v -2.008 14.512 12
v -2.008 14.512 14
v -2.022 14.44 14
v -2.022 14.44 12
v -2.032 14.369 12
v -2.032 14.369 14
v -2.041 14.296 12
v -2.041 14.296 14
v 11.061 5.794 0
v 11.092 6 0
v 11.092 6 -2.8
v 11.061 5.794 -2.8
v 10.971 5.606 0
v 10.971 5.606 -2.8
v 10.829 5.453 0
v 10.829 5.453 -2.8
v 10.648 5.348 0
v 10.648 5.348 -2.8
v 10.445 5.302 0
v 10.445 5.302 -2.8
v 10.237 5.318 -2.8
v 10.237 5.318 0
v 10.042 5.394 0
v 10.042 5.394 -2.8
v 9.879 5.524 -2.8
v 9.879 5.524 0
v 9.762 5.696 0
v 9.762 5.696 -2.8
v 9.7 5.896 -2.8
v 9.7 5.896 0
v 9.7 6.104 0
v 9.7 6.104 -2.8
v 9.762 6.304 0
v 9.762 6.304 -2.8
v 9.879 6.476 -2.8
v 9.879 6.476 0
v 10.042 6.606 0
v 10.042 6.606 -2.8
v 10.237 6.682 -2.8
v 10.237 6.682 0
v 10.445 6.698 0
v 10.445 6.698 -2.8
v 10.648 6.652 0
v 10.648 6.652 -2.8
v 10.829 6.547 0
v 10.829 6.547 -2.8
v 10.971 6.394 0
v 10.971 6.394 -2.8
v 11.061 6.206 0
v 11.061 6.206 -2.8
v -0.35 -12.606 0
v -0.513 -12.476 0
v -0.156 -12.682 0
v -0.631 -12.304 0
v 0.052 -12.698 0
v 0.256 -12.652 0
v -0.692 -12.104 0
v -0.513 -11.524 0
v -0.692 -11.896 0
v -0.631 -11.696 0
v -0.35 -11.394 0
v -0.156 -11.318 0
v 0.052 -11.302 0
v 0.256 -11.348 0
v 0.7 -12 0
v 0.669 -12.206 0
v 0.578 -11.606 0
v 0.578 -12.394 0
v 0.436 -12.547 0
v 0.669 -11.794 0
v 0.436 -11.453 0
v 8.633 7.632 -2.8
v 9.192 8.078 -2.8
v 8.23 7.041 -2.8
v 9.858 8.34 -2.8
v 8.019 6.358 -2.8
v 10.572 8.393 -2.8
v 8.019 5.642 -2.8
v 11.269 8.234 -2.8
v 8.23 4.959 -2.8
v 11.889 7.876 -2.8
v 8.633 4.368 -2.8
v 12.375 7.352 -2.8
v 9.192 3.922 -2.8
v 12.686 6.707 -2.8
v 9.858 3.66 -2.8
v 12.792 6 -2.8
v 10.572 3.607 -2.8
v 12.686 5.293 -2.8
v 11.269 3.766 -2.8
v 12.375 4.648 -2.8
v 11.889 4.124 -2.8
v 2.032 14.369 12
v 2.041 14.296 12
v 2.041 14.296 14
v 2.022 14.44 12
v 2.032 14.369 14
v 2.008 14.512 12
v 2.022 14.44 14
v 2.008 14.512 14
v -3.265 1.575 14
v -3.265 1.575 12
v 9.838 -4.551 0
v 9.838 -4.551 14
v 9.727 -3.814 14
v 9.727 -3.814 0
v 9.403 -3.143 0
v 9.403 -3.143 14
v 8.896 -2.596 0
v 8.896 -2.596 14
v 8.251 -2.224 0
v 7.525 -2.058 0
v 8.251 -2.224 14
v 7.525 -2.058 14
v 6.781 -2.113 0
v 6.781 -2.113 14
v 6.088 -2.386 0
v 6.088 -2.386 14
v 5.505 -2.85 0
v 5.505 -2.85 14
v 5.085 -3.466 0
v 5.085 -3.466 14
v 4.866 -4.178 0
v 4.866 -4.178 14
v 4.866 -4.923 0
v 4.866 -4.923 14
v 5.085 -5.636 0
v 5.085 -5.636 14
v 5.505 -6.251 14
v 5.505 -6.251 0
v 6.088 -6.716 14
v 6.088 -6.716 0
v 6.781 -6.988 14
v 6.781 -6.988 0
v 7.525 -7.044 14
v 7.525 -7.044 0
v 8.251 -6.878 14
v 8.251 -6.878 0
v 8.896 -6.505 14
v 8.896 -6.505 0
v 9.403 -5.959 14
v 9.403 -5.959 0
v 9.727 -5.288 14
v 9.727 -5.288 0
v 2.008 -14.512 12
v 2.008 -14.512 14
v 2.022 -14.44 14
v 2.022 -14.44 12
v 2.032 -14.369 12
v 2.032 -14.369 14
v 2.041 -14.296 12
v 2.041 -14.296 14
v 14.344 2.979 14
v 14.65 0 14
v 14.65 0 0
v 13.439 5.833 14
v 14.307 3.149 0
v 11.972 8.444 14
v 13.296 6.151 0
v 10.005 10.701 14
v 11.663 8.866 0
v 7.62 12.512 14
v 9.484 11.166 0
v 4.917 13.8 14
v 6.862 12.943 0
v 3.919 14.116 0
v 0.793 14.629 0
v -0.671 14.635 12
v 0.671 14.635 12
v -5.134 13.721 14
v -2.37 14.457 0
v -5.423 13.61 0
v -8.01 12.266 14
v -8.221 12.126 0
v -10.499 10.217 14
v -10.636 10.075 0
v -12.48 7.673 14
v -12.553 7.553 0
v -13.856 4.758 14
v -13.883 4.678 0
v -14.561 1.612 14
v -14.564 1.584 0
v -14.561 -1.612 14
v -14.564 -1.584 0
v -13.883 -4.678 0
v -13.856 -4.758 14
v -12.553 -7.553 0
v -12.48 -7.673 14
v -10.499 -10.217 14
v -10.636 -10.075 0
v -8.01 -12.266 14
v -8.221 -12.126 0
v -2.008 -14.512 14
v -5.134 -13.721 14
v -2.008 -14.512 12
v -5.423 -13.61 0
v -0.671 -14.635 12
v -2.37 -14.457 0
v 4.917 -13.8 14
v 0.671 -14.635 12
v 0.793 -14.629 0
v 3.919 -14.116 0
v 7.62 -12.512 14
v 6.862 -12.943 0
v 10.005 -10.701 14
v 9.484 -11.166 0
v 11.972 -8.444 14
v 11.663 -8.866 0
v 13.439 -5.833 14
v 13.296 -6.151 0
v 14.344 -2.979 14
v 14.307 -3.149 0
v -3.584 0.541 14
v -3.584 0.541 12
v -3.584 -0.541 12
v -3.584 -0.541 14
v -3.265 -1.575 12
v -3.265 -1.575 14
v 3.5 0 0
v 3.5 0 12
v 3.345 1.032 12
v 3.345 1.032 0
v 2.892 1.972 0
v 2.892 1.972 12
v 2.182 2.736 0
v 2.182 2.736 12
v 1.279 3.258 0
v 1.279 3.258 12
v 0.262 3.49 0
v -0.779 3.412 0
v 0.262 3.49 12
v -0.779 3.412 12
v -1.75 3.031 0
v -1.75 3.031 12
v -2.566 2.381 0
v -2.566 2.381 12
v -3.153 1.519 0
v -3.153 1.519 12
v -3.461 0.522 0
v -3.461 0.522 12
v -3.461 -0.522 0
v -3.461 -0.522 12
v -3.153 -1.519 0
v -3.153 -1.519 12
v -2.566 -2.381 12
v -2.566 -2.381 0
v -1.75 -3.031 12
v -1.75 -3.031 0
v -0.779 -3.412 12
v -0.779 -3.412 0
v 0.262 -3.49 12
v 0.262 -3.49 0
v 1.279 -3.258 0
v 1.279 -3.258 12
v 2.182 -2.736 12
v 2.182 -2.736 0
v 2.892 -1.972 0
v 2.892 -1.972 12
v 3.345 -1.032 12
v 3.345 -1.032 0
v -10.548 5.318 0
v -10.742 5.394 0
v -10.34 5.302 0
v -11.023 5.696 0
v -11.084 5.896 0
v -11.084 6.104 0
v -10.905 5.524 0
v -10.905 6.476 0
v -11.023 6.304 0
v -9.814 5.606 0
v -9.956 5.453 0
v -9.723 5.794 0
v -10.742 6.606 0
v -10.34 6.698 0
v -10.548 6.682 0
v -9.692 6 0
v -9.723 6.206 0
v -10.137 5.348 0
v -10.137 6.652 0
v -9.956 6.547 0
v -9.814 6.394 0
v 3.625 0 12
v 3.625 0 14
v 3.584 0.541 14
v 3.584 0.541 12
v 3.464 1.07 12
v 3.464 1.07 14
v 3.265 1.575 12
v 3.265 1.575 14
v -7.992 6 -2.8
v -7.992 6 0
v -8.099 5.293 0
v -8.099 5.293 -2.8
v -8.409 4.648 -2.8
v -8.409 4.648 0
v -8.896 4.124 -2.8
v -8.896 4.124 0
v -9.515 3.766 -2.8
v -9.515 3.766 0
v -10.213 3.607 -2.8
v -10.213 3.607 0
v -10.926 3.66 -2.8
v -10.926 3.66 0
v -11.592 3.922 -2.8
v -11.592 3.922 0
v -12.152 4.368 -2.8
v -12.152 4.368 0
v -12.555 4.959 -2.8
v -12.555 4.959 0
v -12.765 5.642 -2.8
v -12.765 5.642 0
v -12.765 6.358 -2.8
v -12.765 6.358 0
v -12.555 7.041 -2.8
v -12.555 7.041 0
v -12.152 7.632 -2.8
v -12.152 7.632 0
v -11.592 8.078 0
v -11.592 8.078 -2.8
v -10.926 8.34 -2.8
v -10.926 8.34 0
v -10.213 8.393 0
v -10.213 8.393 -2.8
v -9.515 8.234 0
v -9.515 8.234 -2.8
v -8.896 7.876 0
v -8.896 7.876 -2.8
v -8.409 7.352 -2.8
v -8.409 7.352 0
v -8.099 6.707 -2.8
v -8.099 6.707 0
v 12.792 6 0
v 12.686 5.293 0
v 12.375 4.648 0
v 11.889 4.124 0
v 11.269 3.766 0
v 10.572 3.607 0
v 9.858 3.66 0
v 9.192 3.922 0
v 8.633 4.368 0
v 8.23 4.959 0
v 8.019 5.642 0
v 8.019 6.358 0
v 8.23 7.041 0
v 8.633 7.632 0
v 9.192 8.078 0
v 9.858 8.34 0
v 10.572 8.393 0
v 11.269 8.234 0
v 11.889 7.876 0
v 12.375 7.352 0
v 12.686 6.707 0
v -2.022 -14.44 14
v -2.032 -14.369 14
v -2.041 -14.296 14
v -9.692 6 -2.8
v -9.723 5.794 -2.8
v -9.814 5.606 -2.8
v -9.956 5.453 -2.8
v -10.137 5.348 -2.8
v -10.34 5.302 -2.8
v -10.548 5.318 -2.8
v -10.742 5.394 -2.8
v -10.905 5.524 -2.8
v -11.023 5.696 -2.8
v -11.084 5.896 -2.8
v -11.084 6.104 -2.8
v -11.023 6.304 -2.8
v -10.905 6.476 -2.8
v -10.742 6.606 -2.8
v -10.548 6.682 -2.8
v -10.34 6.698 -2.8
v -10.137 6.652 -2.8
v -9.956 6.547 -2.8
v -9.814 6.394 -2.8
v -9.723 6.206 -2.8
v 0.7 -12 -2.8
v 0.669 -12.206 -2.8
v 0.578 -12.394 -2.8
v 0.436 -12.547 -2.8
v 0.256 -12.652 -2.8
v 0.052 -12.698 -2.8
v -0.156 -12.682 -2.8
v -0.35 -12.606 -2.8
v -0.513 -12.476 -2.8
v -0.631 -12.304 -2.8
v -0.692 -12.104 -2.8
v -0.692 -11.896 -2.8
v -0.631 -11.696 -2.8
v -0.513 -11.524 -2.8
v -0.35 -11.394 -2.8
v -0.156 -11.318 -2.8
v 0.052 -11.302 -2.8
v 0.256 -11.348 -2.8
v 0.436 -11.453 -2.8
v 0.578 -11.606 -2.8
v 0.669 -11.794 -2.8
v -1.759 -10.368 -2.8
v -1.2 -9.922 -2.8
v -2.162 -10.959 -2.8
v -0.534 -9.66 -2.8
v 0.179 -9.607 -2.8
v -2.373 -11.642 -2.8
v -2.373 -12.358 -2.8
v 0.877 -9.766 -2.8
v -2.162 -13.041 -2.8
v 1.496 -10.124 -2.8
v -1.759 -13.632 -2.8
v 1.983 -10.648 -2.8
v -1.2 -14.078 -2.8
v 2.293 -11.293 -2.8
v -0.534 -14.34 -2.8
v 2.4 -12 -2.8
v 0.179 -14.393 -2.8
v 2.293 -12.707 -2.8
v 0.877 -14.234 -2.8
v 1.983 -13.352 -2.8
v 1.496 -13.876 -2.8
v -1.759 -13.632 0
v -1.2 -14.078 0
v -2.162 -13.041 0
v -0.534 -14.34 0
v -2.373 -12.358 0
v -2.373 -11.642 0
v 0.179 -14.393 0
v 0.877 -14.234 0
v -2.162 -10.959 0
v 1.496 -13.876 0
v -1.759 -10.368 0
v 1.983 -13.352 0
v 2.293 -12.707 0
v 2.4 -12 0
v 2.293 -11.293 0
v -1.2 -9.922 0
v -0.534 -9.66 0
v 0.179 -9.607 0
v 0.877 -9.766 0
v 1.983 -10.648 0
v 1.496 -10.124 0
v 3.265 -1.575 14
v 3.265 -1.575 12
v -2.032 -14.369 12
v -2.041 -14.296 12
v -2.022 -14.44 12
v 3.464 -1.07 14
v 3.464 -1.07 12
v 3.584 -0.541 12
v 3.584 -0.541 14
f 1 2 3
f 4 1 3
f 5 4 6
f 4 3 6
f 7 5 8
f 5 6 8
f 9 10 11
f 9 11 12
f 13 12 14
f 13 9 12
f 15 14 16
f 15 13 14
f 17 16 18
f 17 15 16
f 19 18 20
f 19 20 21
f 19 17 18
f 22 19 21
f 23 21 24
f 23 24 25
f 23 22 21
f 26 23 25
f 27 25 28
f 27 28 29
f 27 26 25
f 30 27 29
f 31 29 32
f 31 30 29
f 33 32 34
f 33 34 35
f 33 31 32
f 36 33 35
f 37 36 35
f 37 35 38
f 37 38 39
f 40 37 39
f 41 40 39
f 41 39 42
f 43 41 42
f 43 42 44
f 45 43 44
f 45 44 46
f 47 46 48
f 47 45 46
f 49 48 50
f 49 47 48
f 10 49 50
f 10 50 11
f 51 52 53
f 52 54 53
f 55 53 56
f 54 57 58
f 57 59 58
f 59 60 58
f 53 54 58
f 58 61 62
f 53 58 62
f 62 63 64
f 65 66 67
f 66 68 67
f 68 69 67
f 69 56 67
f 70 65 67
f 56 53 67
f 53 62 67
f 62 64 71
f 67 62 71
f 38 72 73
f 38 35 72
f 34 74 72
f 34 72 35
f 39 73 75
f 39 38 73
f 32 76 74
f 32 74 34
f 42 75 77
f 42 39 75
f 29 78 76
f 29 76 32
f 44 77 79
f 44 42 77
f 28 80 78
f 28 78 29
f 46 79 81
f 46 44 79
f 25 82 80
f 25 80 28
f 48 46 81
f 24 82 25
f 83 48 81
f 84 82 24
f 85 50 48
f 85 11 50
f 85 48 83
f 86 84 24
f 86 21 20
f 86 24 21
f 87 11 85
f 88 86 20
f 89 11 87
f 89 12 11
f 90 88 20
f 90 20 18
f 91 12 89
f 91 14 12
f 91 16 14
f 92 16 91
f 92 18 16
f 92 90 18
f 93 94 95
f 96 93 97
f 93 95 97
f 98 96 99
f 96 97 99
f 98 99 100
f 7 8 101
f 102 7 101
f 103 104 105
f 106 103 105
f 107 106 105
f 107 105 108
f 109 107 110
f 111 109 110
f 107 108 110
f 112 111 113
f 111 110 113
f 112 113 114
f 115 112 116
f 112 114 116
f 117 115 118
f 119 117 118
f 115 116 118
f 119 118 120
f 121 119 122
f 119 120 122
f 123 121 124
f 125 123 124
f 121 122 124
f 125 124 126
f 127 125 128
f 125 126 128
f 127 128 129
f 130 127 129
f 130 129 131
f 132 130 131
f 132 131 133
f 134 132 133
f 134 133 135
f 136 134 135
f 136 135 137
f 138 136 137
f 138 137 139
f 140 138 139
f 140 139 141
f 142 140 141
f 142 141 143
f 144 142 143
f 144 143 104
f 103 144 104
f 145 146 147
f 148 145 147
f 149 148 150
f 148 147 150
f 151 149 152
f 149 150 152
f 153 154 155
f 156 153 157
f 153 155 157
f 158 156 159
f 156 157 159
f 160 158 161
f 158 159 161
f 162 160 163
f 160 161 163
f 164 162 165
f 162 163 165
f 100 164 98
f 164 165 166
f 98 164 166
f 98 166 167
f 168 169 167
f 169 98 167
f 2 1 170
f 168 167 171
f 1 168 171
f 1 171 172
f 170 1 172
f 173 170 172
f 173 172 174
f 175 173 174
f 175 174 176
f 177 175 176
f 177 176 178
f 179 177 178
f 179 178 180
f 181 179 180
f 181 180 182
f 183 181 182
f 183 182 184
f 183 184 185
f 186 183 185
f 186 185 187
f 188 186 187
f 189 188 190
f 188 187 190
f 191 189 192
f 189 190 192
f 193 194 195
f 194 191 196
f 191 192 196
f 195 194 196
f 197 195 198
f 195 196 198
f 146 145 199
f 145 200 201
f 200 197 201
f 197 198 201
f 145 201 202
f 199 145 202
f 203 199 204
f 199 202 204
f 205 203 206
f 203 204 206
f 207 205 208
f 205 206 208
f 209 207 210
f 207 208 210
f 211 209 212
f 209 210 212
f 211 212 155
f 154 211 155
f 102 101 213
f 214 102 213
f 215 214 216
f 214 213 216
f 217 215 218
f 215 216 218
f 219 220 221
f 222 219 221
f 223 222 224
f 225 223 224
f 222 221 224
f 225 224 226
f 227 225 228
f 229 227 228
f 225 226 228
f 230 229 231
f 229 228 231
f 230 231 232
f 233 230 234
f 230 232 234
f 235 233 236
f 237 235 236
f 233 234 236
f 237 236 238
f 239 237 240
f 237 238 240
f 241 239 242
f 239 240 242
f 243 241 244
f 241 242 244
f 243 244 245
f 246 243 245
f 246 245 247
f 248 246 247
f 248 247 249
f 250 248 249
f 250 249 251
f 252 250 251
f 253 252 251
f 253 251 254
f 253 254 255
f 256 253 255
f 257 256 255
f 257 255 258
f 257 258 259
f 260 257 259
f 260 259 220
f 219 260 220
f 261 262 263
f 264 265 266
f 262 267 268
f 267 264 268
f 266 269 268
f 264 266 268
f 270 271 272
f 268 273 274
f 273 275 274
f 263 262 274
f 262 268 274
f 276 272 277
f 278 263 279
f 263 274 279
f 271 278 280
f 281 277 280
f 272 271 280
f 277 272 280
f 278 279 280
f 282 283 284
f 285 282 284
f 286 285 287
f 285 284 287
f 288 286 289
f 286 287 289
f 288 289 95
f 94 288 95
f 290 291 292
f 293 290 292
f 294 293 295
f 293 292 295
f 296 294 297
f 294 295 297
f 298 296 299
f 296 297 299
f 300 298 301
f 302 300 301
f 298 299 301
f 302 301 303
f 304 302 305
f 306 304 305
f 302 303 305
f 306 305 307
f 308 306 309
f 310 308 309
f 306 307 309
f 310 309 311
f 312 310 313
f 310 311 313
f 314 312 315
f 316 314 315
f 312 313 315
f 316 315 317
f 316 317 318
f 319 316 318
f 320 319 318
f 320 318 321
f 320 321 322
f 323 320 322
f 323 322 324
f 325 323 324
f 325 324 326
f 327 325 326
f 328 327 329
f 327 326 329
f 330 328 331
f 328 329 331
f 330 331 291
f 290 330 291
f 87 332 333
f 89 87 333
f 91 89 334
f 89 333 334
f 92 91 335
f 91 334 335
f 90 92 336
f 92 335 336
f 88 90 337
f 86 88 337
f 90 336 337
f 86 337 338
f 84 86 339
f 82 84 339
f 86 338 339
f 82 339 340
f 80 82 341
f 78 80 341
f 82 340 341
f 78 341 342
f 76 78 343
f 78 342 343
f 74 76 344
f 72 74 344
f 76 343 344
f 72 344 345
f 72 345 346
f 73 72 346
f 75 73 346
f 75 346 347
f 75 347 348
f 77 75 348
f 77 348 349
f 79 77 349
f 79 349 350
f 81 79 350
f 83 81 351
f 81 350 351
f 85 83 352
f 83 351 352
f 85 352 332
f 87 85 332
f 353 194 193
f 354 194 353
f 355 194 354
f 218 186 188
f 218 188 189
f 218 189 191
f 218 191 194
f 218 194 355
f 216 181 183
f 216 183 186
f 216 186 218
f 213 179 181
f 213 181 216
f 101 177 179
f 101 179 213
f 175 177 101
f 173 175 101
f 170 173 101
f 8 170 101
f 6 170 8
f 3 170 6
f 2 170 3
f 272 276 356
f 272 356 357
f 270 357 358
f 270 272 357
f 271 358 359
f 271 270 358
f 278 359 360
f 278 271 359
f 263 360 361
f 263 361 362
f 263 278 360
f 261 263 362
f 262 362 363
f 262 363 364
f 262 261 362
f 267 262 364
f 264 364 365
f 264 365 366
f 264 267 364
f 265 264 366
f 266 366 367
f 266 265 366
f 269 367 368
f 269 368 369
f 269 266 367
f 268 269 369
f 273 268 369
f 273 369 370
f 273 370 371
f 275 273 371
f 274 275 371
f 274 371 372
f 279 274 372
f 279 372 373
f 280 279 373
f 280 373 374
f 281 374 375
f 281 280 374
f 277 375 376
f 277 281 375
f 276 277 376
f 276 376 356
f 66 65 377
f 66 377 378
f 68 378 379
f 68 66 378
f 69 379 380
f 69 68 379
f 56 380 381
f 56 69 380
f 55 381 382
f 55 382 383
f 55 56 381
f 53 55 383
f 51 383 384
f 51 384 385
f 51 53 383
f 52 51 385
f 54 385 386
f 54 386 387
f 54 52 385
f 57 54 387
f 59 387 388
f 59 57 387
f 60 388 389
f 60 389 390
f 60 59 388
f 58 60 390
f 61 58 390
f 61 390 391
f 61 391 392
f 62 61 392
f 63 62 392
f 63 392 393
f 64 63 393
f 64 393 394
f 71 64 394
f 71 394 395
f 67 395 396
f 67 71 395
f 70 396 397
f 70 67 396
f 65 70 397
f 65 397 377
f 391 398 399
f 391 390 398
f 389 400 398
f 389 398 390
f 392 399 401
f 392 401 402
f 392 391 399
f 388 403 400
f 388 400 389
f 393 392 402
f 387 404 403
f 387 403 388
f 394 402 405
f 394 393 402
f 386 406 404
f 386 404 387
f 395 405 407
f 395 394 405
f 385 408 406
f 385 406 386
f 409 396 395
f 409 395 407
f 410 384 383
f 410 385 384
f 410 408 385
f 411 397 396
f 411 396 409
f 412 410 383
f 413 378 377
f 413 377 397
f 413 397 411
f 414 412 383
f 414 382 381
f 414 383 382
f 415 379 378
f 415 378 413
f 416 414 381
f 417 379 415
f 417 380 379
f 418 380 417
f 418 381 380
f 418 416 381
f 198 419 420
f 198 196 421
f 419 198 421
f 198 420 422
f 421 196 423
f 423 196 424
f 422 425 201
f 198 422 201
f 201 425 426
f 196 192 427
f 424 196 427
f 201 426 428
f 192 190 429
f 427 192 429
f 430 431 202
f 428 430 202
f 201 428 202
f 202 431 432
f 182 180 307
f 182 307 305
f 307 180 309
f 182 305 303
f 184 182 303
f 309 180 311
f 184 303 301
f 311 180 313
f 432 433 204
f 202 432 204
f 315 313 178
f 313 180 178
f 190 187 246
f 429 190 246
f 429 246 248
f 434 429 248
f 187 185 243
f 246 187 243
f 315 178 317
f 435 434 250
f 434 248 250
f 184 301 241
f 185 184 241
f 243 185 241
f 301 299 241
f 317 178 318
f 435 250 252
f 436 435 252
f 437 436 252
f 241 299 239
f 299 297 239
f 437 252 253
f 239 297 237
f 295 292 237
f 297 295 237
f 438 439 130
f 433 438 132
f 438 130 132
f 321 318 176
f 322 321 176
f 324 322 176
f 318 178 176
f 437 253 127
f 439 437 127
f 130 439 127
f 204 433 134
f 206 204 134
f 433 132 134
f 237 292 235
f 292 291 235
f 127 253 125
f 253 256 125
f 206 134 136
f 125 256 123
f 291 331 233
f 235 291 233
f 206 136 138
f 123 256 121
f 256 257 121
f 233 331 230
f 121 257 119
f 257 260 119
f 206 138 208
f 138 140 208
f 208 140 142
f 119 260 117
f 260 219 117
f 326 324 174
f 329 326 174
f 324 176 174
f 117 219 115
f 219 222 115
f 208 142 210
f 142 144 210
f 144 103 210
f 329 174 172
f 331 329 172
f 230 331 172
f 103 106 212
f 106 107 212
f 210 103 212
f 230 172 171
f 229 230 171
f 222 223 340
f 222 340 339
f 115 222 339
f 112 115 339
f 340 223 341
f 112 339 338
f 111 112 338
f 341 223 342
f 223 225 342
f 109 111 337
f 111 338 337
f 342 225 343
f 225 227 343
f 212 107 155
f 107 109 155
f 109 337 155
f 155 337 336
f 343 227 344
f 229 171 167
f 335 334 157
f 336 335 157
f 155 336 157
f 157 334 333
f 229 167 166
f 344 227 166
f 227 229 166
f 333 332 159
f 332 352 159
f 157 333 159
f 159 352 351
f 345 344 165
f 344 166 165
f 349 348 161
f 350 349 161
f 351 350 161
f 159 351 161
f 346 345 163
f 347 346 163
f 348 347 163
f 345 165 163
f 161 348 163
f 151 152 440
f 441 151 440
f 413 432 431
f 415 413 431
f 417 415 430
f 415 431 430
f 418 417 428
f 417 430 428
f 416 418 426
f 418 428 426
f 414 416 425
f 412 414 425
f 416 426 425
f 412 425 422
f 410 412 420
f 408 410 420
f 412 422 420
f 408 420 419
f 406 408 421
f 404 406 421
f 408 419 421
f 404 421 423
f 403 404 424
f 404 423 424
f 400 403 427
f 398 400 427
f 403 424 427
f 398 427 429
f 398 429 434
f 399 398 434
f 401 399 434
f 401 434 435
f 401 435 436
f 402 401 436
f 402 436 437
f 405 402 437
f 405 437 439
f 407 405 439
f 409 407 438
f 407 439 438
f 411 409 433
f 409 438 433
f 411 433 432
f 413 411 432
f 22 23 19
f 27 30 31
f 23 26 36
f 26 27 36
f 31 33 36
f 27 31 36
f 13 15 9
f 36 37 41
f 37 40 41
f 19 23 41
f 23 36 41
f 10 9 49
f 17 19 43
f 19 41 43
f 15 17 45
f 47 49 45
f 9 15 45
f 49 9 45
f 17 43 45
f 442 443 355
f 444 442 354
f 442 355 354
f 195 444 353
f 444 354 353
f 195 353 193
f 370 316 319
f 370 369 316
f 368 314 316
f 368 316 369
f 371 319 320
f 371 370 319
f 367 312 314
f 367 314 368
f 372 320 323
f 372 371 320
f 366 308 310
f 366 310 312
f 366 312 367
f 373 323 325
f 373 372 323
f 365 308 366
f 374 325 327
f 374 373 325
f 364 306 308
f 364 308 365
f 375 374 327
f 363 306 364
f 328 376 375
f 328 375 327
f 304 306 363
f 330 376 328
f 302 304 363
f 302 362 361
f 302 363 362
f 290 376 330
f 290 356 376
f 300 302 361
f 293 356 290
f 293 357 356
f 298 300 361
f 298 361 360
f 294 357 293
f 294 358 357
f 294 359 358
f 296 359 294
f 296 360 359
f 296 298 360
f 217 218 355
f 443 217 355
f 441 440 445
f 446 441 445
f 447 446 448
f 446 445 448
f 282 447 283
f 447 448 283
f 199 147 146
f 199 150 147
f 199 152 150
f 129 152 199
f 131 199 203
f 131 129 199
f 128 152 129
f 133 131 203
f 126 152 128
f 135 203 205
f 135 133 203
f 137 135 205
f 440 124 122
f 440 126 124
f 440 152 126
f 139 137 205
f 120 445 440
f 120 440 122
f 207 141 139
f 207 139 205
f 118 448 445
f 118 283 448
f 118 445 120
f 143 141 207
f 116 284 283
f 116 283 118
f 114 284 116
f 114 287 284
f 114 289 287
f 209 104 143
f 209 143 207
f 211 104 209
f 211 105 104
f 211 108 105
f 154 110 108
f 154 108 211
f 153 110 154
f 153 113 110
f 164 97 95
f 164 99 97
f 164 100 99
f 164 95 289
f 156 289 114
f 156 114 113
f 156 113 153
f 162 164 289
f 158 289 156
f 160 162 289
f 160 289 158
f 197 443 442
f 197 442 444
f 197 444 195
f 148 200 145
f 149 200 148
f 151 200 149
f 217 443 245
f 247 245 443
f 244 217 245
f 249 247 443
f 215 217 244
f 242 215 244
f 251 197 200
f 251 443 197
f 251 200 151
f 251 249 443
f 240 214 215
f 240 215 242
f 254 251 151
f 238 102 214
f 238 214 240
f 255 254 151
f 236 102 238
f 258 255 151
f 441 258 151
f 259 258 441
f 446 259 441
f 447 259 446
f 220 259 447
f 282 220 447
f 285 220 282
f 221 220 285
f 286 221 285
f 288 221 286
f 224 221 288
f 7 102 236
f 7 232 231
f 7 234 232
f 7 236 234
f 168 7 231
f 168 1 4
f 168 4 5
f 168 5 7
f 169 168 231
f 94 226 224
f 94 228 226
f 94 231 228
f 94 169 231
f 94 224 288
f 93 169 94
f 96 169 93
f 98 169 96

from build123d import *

# Parameters (mm, degrees)
F0_R     = 14.65
F1_DEPTH = 14
F2_R     = 2.4
F2_R_2   = 0.7
F3_DEPTH = 2.8
F4_R     = 3.5
F4_R_2   = 2.5
F5_DEPTH = 25
F7_DEPTH = 2


# Not quite as in the source:
# - a feature of the source that left no trace in its solid (it failed there, or was rolled back) is left out


with BuildPart() as f1:
    # F0 (on Top) → F1 (new body)
    with BuildSketch(Plane.XY):
        Circle(F0_R)
    extrude(amount=F1_DEPTH)

    # F2 (on face) → F3 (join)
    with BuildSketch(Plane(origin=(0, 0, 0), x_dir=(1, 0, 0), z_dir=(0, 0, -1))):
        with Locations((0, 12)):
            Circle(F2_R)
        with Locations((0, 12)):
            Circle(F2_R_2, mode=Mode.SUBTRACT)
        with Locations((-10.3923048454, -6)):
            Circle(F2_R)
        with Locations((-10.3923048454, -6)):
            Circle(F2_R_2, mode=Mode.SUBTRACT)
        with Locations((10.3923048454, -6)):
            Circle(F2_R)
        with Locations((10.3923048454, -6)):
            Circle(F2_R_2, mode=Mode.SUBTRACT)
    extrude(amount=F3_DEPTH)

    # F4 (on face) → F5 (cut)
    with BuildSketch(Plane.XY.offset(14)):
        Circle(F4_R)
        with Locations((7.3377376988, -4.5508025283)):
            Circle(F4_R_2)
    extrude(amount=-F5_DEPTH, mode=Mode.SUBTRACT)

    # F6 (on face) → F7 (cut)
    with BuildSketch(Plane.XY.offset(14)):
        with BuildLine():
            ThreePointArc((3.265158964, -1.5745989775), (3.533894894, -0.8075963582), (3.625, 0))
            ThreePointArc((3.625, 0), (3.533894894, 0.8075963582), (3.265158964, 1.5745989775))
            ThreePointArc((3.265158964, 1.5745989775), (0, 3.625), (-3.265158964, 1.5745989775))
            ThreePointArc((-3.265158964, 1.5745989775), (-3.625, 0), (-3.265158964, -1.5745989775))
            ThreePointArc((-3.265158964, -1.5745989775), (0, -3.625), (3.265158964, -1.5745989775))
        make_face()
        with BuildLine():
            ThreePointArc((-3.265158964, 1.5745989775), (0, 3.625), (3.265158964, 1.5745989775))
            Line((3.265158964, 1.5745989775), (2.0405680426, 14.2964231749))
            ThreePointArc((2.0405680426, 14.2964231749), (2.047640653, 14.1983247495), (2.05, 14.1))
            ThreePointArc((2.05, 14.1), (-0.0983247495, 12.052359347), (-2.0405680426, 14.2964231749))
            Line((-2.0405680426, 14.2964231749), (-3.265158964, 1.5745989775))
        make_face()
        with BuildLine():
            Line((2.0405680426, -14.2964231749), (3.265158964, -1.5745989775))
            ThreePointArc((3.265158964, -1.5745989775), (0, -3.625), (-3.265158964, -1.5745989775))
            Line((-3.265158964, -1.5745989775), (-2.0405680426, -14.2964231749))
            ThreePointArc((-2.0405680426, -14.2964231749), (-0.0983247495, -12.052359347), (2.05, -14.1))
            ThreePointArc((2.05, -14.1), (2.047640653, -14.1983247495), (2.0405680426, -14.2964231749))
        make_face()
        with BuildLine():
            ThreePointArc((2.05, 14.1), (2.047640653, 14.1983247495), (2.0405680426, 14.2964231749))
            ThreePointArc((2.0405680426, 14.2964231749), (0, 16.15), (-2.0405680426, 14.2964231749))
            ThreePointArc((-2.0405680426, 14.2964231749), (-0.0983247495, 12.052359347), (2.05, 14.1))
        make_face()
        with BuildLine():
            ThreePointArc((-2.0405680426, -14.2964231749), (0, -16.15), (2.0405680426, -14.2964231749))
            ThreePointArc((2.0405680426, -14.2964231749), (2.047640653, -14.1983247495), (2.05, -14.1))
            ThreePointArc((2.05, -14.1), (-0.0983247495, -12.052359347), (-2.0405680426, -14.2964231749))
        make_face()
    extrude(amount=-F7_DEPTH, mode=Mode.SUBTRACT)


solid = f1.part
